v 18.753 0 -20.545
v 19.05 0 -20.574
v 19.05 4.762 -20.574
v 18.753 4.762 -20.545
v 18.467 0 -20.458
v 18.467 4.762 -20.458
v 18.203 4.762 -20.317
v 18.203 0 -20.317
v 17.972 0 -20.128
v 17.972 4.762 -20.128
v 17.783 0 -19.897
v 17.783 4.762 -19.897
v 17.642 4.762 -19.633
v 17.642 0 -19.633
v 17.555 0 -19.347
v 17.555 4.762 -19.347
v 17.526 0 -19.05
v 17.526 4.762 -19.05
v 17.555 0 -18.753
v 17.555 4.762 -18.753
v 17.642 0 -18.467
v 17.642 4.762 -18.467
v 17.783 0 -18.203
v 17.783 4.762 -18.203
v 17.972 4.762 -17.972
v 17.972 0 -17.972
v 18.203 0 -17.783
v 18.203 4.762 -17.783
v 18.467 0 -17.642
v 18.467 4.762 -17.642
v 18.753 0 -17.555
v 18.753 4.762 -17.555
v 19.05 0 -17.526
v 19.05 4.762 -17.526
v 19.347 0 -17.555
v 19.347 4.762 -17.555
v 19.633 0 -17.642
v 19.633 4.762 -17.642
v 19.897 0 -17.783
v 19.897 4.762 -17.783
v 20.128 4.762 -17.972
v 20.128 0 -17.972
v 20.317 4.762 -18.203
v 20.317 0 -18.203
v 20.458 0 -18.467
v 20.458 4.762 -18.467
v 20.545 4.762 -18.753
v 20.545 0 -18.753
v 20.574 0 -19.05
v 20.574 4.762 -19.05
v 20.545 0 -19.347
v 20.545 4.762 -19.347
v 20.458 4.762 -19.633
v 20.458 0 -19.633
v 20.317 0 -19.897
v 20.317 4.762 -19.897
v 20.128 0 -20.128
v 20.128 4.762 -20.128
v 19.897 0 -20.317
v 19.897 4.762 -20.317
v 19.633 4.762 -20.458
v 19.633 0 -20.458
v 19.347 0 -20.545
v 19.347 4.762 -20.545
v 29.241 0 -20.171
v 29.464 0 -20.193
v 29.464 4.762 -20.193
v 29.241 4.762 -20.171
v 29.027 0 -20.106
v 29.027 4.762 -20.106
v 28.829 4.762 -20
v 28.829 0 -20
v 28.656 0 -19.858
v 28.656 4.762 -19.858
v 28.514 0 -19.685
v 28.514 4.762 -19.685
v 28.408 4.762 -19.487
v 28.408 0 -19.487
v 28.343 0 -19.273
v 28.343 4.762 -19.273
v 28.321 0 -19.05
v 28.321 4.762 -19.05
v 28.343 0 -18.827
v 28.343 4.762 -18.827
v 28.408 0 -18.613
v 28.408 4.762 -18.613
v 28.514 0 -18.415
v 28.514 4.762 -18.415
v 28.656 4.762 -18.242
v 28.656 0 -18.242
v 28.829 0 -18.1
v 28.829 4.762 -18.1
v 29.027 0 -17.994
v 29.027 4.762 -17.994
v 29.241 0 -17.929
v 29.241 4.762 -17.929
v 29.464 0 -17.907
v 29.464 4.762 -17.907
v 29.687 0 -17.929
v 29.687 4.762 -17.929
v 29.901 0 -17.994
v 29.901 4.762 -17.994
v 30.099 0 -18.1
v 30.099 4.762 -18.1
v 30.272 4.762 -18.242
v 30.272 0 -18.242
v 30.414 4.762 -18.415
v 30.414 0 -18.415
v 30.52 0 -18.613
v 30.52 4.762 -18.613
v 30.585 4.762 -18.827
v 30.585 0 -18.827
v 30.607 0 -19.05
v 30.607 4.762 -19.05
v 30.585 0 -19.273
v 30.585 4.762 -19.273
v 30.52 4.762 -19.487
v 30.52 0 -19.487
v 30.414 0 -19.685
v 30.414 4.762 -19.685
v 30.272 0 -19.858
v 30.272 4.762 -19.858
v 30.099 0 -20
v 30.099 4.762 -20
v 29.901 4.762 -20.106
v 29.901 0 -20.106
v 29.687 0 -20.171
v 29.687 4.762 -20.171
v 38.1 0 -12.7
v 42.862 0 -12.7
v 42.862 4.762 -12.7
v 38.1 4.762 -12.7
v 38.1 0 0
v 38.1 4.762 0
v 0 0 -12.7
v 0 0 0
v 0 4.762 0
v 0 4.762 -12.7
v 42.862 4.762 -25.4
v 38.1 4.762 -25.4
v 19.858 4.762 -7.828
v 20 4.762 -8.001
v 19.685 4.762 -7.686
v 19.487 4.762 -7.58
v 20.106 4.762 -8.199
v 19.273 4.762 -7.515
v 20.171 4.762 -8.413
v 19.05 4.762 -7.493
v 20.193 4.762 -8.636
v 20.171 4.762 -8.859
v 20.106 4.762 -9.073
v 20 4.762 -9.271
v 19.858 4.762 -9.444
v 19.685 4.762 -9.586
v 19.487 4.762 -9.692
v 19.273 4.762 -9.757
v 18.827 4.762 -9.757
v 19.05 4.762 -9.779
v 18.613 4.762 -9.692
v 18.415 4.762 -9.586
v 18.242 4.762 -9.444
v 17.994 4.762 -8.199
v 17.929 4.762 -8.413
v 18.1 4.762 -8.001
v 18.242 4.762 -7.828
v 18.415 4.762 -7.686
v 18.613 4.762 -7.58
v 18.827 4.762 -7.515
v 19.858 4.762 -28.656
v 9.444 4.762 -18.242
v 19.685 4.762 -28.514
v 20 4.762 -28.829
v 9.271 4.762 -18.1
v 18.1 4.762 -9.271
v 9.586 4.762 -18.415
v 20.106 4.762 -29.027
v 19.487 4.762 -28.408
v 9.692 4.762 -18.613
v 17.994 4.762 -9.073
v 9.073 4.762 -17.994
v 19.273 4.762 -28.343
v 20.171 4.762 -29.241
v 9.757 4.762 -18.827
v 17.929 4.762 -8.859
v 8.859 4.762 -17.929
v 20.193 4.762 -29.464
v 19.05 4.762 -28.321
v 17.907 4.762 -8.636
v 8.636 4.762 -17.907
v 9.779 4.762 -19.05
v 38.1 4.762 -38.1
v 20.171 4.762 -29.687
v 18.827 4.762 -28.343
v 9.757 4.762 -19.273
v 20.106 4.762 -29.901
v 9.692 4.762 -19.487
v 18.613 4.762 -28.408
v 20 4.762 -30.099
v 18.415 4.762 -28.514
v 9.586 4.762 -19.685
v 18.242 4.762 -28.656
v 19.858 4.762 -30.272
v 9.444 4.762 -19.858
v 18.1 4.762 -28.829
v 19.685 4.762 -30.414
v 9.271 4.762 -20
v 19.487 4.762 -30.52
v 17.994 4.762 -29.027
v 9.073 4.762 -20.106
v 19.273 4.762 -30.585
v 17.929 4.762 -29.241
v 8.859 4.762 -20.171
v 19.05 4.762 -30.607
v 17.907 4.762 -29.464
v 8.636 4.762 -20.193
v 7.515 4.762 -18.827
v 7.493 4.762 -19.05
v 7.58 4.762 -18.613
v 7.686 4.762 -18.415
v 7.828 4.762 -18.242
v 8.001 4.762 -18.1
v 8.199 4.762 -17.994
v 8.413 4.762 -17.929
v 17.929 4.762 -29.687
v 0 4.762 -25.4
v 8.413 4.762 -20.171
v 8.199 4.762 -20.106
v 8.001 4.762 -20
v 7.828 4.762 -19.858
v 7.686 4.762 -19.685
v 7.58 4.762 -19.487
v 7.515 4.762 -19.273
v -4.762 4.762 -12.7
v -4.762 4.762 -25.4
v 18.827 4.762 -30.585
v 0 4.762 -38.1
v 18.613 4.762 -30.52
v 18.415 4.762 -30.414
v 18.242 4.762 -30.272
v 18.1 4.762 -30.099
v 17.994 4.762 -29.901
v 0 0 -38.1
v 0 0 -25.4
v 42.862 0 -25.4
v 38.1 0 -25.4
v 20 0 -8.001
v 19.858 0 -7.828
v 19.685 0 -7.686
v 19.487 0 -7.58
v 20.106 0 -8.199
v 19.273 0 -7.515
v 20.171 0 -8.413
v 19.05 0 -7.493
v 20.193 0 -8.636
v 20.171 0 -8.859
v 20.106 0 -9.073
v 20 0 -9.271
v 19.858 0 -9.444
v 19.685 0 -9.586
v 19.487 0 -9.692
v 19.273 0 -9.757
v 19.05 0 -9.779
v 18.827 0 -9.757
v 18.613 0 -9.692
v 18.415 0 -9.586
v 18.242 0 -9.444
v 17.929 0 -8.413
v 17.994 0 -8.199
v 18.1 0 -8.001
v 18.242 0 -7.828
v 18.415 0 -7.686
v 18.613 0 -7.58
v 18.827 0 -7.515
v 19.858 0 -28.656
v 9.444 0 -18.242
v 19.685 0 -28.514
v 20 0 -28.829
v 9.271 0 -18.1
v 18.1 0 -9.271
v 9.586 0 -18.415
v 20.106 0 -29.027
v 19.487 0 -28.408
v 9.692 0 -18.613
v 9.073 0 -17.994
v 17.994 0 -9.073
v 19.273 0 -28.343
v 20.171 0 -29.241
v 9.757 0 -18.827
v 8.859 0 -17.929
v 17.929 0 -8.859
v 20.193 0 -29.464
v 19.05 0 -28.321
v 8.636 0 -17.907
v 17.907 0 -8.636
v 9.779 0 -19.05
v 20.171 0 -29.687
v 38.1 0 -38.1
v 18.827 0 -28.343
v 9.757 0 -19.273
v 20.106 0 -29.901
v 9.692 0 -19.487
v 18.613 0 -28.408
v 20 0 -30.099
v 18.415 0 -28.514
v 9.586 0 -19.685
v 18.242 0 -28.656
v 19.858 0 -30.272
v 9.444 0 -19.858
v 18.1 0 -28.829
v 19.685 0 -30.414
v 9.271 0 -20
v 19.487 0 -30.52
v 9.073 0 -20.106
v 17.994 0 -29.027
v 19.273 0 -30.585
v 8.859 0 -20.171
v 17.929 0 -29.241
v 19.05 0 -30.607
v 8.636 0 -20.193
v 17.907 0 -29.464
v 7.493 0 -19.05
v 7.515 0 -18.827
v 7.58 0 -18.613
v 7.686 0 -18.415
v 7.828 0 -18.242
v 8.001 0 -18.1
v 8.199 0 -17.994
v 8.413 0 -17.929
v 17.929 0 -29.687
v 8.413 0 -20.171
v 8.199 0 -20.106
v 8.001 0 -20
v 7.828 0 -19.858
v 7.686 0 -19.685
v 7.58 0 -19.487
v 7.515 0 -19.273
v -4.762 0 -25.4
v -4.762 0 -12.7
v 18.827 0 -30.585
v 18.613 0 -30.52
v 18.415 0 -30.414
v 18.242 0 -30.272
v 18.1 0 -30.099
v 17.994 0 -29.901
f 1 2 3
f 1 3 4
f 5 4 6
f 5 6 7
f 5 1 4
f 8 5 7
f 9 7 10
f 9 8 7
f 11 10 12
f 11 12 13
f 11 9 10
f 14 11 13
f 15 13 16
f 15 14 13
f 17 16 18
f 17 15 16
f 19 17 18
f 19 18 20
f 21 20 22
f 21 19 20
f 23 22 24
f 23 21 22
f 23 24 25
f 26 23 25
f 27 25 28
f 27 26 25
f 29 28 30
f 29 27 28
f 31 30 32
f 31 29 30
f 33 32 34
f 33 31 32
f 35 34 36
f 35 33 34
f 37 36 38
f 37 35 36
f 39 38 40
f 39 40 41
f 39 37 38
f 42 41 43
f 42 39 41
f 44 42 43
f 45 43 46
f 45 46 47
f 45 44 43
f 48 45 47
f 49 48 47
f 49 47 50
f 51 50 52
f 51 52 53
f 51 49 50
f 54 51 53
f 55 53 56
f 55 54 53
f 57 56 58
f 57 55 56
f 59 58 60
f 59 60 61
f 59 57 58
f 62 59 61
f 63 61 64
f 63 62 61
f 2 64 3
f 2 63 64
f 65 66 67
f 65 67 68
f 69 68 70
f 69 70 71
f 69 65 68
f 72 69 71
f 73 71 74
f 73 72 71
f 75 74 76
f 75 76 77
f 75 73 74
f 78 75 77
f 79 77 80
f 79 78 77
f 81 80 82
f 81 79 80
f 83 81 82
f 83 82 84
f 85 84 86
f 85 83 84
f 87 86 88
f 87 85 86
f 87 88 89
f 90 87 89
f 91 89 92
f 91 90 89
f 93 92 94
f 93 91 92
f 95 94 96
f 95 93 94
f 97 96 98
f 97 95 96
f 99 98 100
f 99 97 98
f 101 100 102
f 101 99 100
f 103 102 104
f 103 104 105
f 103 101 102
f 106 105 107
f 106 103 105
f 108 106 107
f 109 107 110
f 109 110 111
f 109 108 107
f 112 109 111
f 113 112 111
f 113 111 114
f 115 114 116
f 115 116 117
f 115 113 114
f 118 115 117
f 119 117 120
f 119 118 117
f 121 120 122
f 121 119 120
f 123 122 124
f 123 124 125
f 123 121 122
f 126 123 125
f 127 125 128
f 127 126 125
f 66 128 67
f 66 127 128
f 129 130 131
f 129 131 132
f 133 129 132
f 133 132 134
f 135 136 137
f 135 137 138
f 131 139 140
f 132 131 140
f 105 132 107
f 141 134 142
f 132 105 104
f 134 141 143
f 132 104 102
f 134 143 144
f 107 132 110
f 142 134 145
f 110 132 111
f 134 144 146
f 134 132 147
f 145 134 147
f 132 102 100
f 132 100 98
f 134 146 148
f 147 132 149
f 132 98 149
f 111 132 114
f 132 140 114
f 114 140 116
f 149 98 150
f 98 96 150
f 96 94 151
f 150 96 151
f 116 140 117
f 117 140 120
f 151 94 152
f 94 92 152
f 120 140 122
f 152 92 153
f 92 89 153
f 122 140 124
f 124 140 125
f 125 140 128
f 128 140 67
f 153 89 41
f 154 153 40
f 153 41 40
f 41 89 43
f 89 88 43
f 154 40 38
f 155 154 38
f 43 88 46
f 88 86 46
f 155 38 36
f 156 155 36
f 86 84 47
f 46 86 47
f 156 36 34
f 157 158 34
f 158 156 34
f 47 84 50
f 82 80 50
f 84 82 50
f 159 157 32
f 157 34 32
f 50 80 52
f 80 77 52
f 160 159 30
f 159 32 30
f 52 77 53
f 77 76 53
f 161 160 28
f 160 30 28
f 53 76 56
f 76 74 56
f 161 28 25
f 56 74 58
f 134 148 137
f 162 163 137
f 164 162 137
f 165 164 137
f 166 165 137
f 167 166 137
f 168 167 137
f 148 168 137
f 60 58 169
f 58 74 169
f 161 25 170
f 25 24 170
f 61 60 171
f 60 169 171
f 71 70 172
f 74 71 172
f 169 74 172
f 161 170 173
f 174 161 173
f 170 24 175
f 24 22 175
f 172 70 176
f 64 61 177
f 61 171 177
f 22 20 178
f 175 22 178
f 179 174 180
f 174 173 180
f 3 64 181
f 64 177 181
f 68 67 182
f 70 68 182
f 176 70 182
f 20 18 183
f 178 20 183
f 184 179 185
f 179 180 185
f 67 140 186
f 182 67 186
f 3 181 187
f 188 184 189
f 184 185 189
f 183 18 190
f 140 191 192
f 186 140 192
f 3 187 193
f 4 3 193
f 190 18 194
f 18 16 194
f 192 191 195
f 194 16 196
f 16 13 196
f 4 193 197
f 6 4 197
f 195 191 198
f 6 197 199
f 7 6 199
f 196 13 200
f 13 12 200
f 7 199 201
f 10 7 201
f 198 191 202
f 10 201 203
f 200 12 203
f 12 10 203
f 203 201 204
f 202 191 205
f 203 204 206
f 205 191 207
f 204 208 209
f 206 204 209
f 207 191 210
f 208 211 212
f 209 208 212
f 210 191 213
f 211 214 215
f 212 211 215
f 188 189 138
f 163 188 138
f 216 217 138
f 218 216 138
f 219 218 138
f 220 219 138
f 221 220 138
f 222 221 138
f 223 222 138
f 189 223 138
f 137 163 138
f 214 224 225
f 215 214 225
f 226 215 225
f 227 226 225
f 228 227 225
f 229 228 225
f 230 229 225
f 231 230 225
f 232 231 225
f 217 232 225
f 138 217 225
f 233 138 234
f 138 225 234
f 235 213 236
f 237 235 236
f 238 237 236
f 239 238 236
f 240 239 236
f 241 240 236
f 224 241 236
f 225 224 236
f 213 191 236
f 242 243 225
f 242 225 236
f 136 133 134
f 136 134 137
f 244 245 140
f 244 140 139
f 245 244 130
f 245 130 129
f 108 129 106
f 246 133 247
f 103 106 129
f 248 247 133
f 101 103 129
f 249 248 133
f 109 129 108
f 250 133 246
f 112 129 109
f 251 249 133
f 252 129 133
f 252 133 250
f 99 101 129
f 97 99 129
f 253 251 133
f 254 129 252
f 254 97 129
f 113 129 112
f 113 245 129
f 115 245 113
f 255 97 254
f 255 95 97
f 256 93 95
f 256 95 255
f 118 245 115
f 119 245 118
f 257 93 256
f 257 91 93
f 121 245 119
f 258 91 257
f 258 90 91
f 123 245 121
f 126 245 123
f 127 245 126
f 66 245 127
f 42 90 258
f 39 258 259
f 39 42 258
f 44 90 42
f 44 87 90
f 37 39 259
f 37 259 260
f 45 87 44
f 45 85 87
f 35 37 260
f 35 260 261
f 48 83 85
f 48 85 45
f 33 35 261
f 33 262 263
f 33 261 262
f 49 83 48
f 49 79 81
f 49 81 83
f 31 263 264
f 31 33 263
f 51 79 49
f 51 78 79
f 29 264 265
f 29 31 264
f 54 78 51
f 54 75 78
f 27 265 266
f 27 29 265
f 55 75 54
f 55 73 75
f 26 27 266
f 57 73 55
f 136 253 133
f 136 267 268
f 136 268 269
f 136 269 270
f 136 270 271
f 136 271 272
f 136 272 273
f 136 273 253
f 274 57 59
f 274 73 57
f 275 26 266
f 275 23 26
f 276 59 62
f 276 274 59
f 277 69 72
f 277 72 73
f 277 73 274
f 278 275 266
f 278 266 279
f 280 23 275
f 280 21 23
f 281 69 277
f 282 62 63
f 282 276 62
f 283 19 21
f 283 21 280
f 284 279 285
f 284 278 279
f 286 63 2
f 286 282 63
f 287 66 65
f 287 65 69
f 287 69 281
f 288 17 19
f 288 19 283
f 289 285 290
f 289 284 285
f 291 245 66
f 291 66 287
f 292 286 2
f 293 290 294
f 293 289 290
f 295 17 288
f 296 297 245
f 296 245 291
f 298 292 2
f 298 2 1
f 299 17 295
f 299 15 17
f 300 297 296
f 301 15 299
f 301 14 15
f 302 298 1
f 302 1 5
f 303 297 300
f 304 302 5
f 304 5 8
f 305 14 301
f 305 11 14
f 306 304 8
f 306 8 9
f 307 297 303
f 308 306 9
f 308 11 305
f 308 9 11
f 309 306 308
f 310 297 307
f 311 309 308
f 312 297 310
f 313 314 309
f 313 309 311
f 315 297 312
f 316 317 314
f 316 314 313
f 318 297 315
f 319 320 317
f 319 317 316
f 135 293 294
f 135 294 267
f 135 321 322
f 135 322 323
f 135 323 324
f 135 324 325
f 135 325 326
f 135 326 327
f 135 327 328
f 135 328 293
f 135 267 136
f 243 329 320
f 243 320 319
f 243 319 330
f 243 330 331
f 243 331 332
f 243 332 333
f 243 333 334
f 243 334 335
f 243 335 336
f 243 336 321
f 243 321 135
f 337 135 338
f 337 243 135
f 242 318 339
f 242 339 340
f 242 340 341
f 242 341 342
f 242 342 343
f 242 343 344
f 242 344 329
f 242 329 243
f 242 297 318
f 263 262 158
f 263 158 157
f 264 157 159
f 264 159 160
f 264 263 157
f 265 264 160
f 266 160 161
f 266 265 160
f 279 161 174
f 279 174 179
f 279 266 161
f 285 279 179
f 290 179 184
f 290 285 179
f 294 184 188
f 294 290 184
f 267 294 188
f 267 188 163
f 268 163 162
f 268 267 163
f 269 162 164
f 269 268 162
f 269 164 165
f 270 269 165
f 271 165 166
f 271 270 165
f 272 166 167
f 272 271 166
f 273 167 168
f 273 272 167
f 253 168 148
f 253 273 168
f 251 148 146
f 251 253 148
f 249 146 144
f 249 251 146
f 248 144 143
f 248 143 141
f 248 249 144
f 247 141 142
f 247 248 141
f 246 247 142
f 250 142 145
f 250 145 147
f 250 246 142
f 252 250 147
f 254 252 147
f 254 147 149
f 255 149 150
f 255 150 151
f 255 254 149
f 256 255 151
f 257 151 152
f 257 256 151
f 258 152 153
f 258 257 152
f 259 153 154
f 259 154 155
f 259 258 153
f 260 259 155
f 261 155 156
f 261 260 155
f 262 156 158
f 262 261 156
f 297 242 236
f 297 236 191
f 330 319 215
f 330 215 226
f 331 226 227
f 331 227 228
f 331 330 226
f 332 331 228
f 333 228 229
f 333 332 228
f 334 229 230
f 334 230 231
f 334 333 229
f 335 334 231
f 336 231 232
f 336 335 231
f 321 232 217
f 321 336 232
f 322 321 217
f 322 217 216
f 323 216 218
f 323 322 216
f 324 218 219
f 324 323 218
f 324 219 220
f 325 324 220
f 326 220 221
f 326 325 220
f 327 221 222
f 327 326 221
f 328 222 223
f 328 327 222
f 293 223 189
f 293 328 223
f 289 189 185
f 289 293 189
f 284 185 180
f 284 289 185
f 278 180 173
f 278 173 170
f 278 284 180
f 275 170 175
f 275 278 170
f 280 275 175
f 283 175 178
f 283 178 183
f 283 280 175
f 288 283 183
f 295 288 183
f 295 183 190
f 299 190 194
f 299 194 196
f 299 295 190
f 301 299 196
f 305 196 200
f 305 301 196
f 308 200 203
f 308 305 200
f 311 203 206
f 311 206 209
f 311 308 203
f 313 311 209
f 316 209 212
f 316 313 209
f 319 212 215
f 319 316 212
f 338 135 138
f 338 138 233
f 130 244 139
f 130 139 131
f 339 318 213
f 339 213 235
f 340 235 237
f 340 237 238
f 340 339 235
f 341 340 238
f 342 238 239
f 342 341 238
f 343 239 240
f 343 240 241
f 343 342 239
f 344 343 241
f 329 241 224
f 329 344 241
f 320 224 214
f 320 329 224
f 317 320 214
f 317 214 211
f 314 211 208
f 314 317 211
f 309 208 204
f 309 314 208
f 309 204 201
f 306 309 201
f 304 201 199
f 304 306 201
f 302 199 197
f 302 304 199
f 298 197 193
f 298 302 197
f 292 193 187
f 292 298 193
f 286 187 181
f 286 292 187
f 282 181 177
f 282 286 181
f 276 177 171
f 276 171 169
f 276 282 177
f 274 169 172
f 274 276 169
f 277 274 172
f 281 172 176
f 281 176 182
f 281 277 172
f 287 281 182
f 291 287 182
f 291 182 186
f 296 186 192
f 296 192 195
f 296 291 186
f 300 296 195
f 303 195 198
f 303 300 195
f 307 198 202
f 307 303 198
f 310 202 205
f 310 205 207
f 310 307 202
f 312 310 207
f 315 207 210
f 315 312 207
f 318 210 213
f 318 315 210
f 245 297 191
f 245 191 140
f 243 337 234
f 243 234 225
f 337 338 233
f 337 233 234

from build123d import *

# Parameters (mm, degrees)
SKETCH1_R           = 1.524
SKETCH1_R_2         = 1.143
BOSS_EXTRUDE1_DEPTH = 4.7625


with BuildPart() as part:
    # Sketch1 → Boss-Extrude1 (new body)
    with BuildSketch(Plane(origin=(0, 0, 0), x_dir=(1, 0, 0), z_dir=(0, 1, 0))):
        Polygon((0, 0), (0, 12.7), (-4.7625, 12.7), (-4.7625, 25.4), (0, 25.4), (0, 38.1), (38.1, 38.1), (38.1, 25.4), (42.8625, 25.4), (42.8625, 12.7), (38.1, 12.7), (38.1, 0), align=None)
        with Locations(Location((19.05, 19.05, 0), (0, 0, 90))):
            Circle(SKETCH1_R, mode=Mode.SUBTRACT)
        with Locations(Location((29.464, 19.05, 0), (0, 0, 90))):
            Circle(SKETCH1_R_2, mode=Mode.SUBTRACT)
        with Locations(Location((19.05, 8.636, 0), (0, 0, 90))):
            Circle(SKETCH1_R_2, mode=Mode.SUBTRACT)
        with Locations(Location((8.636, 19.05, 0), (0, 0, 90))):
            Circle(SKETCH1_R_2, mode=Mode.SUBTRACT)
        with Locations(Location((19.05, 29.464, 0), (0, 0, 90))):
            Circle(SKETCH1_R_2, mode=Mode.SUBTRACT)
    extrude(amount=BOSS_EXTRUDE1_DEPTH)


solid = part.part
